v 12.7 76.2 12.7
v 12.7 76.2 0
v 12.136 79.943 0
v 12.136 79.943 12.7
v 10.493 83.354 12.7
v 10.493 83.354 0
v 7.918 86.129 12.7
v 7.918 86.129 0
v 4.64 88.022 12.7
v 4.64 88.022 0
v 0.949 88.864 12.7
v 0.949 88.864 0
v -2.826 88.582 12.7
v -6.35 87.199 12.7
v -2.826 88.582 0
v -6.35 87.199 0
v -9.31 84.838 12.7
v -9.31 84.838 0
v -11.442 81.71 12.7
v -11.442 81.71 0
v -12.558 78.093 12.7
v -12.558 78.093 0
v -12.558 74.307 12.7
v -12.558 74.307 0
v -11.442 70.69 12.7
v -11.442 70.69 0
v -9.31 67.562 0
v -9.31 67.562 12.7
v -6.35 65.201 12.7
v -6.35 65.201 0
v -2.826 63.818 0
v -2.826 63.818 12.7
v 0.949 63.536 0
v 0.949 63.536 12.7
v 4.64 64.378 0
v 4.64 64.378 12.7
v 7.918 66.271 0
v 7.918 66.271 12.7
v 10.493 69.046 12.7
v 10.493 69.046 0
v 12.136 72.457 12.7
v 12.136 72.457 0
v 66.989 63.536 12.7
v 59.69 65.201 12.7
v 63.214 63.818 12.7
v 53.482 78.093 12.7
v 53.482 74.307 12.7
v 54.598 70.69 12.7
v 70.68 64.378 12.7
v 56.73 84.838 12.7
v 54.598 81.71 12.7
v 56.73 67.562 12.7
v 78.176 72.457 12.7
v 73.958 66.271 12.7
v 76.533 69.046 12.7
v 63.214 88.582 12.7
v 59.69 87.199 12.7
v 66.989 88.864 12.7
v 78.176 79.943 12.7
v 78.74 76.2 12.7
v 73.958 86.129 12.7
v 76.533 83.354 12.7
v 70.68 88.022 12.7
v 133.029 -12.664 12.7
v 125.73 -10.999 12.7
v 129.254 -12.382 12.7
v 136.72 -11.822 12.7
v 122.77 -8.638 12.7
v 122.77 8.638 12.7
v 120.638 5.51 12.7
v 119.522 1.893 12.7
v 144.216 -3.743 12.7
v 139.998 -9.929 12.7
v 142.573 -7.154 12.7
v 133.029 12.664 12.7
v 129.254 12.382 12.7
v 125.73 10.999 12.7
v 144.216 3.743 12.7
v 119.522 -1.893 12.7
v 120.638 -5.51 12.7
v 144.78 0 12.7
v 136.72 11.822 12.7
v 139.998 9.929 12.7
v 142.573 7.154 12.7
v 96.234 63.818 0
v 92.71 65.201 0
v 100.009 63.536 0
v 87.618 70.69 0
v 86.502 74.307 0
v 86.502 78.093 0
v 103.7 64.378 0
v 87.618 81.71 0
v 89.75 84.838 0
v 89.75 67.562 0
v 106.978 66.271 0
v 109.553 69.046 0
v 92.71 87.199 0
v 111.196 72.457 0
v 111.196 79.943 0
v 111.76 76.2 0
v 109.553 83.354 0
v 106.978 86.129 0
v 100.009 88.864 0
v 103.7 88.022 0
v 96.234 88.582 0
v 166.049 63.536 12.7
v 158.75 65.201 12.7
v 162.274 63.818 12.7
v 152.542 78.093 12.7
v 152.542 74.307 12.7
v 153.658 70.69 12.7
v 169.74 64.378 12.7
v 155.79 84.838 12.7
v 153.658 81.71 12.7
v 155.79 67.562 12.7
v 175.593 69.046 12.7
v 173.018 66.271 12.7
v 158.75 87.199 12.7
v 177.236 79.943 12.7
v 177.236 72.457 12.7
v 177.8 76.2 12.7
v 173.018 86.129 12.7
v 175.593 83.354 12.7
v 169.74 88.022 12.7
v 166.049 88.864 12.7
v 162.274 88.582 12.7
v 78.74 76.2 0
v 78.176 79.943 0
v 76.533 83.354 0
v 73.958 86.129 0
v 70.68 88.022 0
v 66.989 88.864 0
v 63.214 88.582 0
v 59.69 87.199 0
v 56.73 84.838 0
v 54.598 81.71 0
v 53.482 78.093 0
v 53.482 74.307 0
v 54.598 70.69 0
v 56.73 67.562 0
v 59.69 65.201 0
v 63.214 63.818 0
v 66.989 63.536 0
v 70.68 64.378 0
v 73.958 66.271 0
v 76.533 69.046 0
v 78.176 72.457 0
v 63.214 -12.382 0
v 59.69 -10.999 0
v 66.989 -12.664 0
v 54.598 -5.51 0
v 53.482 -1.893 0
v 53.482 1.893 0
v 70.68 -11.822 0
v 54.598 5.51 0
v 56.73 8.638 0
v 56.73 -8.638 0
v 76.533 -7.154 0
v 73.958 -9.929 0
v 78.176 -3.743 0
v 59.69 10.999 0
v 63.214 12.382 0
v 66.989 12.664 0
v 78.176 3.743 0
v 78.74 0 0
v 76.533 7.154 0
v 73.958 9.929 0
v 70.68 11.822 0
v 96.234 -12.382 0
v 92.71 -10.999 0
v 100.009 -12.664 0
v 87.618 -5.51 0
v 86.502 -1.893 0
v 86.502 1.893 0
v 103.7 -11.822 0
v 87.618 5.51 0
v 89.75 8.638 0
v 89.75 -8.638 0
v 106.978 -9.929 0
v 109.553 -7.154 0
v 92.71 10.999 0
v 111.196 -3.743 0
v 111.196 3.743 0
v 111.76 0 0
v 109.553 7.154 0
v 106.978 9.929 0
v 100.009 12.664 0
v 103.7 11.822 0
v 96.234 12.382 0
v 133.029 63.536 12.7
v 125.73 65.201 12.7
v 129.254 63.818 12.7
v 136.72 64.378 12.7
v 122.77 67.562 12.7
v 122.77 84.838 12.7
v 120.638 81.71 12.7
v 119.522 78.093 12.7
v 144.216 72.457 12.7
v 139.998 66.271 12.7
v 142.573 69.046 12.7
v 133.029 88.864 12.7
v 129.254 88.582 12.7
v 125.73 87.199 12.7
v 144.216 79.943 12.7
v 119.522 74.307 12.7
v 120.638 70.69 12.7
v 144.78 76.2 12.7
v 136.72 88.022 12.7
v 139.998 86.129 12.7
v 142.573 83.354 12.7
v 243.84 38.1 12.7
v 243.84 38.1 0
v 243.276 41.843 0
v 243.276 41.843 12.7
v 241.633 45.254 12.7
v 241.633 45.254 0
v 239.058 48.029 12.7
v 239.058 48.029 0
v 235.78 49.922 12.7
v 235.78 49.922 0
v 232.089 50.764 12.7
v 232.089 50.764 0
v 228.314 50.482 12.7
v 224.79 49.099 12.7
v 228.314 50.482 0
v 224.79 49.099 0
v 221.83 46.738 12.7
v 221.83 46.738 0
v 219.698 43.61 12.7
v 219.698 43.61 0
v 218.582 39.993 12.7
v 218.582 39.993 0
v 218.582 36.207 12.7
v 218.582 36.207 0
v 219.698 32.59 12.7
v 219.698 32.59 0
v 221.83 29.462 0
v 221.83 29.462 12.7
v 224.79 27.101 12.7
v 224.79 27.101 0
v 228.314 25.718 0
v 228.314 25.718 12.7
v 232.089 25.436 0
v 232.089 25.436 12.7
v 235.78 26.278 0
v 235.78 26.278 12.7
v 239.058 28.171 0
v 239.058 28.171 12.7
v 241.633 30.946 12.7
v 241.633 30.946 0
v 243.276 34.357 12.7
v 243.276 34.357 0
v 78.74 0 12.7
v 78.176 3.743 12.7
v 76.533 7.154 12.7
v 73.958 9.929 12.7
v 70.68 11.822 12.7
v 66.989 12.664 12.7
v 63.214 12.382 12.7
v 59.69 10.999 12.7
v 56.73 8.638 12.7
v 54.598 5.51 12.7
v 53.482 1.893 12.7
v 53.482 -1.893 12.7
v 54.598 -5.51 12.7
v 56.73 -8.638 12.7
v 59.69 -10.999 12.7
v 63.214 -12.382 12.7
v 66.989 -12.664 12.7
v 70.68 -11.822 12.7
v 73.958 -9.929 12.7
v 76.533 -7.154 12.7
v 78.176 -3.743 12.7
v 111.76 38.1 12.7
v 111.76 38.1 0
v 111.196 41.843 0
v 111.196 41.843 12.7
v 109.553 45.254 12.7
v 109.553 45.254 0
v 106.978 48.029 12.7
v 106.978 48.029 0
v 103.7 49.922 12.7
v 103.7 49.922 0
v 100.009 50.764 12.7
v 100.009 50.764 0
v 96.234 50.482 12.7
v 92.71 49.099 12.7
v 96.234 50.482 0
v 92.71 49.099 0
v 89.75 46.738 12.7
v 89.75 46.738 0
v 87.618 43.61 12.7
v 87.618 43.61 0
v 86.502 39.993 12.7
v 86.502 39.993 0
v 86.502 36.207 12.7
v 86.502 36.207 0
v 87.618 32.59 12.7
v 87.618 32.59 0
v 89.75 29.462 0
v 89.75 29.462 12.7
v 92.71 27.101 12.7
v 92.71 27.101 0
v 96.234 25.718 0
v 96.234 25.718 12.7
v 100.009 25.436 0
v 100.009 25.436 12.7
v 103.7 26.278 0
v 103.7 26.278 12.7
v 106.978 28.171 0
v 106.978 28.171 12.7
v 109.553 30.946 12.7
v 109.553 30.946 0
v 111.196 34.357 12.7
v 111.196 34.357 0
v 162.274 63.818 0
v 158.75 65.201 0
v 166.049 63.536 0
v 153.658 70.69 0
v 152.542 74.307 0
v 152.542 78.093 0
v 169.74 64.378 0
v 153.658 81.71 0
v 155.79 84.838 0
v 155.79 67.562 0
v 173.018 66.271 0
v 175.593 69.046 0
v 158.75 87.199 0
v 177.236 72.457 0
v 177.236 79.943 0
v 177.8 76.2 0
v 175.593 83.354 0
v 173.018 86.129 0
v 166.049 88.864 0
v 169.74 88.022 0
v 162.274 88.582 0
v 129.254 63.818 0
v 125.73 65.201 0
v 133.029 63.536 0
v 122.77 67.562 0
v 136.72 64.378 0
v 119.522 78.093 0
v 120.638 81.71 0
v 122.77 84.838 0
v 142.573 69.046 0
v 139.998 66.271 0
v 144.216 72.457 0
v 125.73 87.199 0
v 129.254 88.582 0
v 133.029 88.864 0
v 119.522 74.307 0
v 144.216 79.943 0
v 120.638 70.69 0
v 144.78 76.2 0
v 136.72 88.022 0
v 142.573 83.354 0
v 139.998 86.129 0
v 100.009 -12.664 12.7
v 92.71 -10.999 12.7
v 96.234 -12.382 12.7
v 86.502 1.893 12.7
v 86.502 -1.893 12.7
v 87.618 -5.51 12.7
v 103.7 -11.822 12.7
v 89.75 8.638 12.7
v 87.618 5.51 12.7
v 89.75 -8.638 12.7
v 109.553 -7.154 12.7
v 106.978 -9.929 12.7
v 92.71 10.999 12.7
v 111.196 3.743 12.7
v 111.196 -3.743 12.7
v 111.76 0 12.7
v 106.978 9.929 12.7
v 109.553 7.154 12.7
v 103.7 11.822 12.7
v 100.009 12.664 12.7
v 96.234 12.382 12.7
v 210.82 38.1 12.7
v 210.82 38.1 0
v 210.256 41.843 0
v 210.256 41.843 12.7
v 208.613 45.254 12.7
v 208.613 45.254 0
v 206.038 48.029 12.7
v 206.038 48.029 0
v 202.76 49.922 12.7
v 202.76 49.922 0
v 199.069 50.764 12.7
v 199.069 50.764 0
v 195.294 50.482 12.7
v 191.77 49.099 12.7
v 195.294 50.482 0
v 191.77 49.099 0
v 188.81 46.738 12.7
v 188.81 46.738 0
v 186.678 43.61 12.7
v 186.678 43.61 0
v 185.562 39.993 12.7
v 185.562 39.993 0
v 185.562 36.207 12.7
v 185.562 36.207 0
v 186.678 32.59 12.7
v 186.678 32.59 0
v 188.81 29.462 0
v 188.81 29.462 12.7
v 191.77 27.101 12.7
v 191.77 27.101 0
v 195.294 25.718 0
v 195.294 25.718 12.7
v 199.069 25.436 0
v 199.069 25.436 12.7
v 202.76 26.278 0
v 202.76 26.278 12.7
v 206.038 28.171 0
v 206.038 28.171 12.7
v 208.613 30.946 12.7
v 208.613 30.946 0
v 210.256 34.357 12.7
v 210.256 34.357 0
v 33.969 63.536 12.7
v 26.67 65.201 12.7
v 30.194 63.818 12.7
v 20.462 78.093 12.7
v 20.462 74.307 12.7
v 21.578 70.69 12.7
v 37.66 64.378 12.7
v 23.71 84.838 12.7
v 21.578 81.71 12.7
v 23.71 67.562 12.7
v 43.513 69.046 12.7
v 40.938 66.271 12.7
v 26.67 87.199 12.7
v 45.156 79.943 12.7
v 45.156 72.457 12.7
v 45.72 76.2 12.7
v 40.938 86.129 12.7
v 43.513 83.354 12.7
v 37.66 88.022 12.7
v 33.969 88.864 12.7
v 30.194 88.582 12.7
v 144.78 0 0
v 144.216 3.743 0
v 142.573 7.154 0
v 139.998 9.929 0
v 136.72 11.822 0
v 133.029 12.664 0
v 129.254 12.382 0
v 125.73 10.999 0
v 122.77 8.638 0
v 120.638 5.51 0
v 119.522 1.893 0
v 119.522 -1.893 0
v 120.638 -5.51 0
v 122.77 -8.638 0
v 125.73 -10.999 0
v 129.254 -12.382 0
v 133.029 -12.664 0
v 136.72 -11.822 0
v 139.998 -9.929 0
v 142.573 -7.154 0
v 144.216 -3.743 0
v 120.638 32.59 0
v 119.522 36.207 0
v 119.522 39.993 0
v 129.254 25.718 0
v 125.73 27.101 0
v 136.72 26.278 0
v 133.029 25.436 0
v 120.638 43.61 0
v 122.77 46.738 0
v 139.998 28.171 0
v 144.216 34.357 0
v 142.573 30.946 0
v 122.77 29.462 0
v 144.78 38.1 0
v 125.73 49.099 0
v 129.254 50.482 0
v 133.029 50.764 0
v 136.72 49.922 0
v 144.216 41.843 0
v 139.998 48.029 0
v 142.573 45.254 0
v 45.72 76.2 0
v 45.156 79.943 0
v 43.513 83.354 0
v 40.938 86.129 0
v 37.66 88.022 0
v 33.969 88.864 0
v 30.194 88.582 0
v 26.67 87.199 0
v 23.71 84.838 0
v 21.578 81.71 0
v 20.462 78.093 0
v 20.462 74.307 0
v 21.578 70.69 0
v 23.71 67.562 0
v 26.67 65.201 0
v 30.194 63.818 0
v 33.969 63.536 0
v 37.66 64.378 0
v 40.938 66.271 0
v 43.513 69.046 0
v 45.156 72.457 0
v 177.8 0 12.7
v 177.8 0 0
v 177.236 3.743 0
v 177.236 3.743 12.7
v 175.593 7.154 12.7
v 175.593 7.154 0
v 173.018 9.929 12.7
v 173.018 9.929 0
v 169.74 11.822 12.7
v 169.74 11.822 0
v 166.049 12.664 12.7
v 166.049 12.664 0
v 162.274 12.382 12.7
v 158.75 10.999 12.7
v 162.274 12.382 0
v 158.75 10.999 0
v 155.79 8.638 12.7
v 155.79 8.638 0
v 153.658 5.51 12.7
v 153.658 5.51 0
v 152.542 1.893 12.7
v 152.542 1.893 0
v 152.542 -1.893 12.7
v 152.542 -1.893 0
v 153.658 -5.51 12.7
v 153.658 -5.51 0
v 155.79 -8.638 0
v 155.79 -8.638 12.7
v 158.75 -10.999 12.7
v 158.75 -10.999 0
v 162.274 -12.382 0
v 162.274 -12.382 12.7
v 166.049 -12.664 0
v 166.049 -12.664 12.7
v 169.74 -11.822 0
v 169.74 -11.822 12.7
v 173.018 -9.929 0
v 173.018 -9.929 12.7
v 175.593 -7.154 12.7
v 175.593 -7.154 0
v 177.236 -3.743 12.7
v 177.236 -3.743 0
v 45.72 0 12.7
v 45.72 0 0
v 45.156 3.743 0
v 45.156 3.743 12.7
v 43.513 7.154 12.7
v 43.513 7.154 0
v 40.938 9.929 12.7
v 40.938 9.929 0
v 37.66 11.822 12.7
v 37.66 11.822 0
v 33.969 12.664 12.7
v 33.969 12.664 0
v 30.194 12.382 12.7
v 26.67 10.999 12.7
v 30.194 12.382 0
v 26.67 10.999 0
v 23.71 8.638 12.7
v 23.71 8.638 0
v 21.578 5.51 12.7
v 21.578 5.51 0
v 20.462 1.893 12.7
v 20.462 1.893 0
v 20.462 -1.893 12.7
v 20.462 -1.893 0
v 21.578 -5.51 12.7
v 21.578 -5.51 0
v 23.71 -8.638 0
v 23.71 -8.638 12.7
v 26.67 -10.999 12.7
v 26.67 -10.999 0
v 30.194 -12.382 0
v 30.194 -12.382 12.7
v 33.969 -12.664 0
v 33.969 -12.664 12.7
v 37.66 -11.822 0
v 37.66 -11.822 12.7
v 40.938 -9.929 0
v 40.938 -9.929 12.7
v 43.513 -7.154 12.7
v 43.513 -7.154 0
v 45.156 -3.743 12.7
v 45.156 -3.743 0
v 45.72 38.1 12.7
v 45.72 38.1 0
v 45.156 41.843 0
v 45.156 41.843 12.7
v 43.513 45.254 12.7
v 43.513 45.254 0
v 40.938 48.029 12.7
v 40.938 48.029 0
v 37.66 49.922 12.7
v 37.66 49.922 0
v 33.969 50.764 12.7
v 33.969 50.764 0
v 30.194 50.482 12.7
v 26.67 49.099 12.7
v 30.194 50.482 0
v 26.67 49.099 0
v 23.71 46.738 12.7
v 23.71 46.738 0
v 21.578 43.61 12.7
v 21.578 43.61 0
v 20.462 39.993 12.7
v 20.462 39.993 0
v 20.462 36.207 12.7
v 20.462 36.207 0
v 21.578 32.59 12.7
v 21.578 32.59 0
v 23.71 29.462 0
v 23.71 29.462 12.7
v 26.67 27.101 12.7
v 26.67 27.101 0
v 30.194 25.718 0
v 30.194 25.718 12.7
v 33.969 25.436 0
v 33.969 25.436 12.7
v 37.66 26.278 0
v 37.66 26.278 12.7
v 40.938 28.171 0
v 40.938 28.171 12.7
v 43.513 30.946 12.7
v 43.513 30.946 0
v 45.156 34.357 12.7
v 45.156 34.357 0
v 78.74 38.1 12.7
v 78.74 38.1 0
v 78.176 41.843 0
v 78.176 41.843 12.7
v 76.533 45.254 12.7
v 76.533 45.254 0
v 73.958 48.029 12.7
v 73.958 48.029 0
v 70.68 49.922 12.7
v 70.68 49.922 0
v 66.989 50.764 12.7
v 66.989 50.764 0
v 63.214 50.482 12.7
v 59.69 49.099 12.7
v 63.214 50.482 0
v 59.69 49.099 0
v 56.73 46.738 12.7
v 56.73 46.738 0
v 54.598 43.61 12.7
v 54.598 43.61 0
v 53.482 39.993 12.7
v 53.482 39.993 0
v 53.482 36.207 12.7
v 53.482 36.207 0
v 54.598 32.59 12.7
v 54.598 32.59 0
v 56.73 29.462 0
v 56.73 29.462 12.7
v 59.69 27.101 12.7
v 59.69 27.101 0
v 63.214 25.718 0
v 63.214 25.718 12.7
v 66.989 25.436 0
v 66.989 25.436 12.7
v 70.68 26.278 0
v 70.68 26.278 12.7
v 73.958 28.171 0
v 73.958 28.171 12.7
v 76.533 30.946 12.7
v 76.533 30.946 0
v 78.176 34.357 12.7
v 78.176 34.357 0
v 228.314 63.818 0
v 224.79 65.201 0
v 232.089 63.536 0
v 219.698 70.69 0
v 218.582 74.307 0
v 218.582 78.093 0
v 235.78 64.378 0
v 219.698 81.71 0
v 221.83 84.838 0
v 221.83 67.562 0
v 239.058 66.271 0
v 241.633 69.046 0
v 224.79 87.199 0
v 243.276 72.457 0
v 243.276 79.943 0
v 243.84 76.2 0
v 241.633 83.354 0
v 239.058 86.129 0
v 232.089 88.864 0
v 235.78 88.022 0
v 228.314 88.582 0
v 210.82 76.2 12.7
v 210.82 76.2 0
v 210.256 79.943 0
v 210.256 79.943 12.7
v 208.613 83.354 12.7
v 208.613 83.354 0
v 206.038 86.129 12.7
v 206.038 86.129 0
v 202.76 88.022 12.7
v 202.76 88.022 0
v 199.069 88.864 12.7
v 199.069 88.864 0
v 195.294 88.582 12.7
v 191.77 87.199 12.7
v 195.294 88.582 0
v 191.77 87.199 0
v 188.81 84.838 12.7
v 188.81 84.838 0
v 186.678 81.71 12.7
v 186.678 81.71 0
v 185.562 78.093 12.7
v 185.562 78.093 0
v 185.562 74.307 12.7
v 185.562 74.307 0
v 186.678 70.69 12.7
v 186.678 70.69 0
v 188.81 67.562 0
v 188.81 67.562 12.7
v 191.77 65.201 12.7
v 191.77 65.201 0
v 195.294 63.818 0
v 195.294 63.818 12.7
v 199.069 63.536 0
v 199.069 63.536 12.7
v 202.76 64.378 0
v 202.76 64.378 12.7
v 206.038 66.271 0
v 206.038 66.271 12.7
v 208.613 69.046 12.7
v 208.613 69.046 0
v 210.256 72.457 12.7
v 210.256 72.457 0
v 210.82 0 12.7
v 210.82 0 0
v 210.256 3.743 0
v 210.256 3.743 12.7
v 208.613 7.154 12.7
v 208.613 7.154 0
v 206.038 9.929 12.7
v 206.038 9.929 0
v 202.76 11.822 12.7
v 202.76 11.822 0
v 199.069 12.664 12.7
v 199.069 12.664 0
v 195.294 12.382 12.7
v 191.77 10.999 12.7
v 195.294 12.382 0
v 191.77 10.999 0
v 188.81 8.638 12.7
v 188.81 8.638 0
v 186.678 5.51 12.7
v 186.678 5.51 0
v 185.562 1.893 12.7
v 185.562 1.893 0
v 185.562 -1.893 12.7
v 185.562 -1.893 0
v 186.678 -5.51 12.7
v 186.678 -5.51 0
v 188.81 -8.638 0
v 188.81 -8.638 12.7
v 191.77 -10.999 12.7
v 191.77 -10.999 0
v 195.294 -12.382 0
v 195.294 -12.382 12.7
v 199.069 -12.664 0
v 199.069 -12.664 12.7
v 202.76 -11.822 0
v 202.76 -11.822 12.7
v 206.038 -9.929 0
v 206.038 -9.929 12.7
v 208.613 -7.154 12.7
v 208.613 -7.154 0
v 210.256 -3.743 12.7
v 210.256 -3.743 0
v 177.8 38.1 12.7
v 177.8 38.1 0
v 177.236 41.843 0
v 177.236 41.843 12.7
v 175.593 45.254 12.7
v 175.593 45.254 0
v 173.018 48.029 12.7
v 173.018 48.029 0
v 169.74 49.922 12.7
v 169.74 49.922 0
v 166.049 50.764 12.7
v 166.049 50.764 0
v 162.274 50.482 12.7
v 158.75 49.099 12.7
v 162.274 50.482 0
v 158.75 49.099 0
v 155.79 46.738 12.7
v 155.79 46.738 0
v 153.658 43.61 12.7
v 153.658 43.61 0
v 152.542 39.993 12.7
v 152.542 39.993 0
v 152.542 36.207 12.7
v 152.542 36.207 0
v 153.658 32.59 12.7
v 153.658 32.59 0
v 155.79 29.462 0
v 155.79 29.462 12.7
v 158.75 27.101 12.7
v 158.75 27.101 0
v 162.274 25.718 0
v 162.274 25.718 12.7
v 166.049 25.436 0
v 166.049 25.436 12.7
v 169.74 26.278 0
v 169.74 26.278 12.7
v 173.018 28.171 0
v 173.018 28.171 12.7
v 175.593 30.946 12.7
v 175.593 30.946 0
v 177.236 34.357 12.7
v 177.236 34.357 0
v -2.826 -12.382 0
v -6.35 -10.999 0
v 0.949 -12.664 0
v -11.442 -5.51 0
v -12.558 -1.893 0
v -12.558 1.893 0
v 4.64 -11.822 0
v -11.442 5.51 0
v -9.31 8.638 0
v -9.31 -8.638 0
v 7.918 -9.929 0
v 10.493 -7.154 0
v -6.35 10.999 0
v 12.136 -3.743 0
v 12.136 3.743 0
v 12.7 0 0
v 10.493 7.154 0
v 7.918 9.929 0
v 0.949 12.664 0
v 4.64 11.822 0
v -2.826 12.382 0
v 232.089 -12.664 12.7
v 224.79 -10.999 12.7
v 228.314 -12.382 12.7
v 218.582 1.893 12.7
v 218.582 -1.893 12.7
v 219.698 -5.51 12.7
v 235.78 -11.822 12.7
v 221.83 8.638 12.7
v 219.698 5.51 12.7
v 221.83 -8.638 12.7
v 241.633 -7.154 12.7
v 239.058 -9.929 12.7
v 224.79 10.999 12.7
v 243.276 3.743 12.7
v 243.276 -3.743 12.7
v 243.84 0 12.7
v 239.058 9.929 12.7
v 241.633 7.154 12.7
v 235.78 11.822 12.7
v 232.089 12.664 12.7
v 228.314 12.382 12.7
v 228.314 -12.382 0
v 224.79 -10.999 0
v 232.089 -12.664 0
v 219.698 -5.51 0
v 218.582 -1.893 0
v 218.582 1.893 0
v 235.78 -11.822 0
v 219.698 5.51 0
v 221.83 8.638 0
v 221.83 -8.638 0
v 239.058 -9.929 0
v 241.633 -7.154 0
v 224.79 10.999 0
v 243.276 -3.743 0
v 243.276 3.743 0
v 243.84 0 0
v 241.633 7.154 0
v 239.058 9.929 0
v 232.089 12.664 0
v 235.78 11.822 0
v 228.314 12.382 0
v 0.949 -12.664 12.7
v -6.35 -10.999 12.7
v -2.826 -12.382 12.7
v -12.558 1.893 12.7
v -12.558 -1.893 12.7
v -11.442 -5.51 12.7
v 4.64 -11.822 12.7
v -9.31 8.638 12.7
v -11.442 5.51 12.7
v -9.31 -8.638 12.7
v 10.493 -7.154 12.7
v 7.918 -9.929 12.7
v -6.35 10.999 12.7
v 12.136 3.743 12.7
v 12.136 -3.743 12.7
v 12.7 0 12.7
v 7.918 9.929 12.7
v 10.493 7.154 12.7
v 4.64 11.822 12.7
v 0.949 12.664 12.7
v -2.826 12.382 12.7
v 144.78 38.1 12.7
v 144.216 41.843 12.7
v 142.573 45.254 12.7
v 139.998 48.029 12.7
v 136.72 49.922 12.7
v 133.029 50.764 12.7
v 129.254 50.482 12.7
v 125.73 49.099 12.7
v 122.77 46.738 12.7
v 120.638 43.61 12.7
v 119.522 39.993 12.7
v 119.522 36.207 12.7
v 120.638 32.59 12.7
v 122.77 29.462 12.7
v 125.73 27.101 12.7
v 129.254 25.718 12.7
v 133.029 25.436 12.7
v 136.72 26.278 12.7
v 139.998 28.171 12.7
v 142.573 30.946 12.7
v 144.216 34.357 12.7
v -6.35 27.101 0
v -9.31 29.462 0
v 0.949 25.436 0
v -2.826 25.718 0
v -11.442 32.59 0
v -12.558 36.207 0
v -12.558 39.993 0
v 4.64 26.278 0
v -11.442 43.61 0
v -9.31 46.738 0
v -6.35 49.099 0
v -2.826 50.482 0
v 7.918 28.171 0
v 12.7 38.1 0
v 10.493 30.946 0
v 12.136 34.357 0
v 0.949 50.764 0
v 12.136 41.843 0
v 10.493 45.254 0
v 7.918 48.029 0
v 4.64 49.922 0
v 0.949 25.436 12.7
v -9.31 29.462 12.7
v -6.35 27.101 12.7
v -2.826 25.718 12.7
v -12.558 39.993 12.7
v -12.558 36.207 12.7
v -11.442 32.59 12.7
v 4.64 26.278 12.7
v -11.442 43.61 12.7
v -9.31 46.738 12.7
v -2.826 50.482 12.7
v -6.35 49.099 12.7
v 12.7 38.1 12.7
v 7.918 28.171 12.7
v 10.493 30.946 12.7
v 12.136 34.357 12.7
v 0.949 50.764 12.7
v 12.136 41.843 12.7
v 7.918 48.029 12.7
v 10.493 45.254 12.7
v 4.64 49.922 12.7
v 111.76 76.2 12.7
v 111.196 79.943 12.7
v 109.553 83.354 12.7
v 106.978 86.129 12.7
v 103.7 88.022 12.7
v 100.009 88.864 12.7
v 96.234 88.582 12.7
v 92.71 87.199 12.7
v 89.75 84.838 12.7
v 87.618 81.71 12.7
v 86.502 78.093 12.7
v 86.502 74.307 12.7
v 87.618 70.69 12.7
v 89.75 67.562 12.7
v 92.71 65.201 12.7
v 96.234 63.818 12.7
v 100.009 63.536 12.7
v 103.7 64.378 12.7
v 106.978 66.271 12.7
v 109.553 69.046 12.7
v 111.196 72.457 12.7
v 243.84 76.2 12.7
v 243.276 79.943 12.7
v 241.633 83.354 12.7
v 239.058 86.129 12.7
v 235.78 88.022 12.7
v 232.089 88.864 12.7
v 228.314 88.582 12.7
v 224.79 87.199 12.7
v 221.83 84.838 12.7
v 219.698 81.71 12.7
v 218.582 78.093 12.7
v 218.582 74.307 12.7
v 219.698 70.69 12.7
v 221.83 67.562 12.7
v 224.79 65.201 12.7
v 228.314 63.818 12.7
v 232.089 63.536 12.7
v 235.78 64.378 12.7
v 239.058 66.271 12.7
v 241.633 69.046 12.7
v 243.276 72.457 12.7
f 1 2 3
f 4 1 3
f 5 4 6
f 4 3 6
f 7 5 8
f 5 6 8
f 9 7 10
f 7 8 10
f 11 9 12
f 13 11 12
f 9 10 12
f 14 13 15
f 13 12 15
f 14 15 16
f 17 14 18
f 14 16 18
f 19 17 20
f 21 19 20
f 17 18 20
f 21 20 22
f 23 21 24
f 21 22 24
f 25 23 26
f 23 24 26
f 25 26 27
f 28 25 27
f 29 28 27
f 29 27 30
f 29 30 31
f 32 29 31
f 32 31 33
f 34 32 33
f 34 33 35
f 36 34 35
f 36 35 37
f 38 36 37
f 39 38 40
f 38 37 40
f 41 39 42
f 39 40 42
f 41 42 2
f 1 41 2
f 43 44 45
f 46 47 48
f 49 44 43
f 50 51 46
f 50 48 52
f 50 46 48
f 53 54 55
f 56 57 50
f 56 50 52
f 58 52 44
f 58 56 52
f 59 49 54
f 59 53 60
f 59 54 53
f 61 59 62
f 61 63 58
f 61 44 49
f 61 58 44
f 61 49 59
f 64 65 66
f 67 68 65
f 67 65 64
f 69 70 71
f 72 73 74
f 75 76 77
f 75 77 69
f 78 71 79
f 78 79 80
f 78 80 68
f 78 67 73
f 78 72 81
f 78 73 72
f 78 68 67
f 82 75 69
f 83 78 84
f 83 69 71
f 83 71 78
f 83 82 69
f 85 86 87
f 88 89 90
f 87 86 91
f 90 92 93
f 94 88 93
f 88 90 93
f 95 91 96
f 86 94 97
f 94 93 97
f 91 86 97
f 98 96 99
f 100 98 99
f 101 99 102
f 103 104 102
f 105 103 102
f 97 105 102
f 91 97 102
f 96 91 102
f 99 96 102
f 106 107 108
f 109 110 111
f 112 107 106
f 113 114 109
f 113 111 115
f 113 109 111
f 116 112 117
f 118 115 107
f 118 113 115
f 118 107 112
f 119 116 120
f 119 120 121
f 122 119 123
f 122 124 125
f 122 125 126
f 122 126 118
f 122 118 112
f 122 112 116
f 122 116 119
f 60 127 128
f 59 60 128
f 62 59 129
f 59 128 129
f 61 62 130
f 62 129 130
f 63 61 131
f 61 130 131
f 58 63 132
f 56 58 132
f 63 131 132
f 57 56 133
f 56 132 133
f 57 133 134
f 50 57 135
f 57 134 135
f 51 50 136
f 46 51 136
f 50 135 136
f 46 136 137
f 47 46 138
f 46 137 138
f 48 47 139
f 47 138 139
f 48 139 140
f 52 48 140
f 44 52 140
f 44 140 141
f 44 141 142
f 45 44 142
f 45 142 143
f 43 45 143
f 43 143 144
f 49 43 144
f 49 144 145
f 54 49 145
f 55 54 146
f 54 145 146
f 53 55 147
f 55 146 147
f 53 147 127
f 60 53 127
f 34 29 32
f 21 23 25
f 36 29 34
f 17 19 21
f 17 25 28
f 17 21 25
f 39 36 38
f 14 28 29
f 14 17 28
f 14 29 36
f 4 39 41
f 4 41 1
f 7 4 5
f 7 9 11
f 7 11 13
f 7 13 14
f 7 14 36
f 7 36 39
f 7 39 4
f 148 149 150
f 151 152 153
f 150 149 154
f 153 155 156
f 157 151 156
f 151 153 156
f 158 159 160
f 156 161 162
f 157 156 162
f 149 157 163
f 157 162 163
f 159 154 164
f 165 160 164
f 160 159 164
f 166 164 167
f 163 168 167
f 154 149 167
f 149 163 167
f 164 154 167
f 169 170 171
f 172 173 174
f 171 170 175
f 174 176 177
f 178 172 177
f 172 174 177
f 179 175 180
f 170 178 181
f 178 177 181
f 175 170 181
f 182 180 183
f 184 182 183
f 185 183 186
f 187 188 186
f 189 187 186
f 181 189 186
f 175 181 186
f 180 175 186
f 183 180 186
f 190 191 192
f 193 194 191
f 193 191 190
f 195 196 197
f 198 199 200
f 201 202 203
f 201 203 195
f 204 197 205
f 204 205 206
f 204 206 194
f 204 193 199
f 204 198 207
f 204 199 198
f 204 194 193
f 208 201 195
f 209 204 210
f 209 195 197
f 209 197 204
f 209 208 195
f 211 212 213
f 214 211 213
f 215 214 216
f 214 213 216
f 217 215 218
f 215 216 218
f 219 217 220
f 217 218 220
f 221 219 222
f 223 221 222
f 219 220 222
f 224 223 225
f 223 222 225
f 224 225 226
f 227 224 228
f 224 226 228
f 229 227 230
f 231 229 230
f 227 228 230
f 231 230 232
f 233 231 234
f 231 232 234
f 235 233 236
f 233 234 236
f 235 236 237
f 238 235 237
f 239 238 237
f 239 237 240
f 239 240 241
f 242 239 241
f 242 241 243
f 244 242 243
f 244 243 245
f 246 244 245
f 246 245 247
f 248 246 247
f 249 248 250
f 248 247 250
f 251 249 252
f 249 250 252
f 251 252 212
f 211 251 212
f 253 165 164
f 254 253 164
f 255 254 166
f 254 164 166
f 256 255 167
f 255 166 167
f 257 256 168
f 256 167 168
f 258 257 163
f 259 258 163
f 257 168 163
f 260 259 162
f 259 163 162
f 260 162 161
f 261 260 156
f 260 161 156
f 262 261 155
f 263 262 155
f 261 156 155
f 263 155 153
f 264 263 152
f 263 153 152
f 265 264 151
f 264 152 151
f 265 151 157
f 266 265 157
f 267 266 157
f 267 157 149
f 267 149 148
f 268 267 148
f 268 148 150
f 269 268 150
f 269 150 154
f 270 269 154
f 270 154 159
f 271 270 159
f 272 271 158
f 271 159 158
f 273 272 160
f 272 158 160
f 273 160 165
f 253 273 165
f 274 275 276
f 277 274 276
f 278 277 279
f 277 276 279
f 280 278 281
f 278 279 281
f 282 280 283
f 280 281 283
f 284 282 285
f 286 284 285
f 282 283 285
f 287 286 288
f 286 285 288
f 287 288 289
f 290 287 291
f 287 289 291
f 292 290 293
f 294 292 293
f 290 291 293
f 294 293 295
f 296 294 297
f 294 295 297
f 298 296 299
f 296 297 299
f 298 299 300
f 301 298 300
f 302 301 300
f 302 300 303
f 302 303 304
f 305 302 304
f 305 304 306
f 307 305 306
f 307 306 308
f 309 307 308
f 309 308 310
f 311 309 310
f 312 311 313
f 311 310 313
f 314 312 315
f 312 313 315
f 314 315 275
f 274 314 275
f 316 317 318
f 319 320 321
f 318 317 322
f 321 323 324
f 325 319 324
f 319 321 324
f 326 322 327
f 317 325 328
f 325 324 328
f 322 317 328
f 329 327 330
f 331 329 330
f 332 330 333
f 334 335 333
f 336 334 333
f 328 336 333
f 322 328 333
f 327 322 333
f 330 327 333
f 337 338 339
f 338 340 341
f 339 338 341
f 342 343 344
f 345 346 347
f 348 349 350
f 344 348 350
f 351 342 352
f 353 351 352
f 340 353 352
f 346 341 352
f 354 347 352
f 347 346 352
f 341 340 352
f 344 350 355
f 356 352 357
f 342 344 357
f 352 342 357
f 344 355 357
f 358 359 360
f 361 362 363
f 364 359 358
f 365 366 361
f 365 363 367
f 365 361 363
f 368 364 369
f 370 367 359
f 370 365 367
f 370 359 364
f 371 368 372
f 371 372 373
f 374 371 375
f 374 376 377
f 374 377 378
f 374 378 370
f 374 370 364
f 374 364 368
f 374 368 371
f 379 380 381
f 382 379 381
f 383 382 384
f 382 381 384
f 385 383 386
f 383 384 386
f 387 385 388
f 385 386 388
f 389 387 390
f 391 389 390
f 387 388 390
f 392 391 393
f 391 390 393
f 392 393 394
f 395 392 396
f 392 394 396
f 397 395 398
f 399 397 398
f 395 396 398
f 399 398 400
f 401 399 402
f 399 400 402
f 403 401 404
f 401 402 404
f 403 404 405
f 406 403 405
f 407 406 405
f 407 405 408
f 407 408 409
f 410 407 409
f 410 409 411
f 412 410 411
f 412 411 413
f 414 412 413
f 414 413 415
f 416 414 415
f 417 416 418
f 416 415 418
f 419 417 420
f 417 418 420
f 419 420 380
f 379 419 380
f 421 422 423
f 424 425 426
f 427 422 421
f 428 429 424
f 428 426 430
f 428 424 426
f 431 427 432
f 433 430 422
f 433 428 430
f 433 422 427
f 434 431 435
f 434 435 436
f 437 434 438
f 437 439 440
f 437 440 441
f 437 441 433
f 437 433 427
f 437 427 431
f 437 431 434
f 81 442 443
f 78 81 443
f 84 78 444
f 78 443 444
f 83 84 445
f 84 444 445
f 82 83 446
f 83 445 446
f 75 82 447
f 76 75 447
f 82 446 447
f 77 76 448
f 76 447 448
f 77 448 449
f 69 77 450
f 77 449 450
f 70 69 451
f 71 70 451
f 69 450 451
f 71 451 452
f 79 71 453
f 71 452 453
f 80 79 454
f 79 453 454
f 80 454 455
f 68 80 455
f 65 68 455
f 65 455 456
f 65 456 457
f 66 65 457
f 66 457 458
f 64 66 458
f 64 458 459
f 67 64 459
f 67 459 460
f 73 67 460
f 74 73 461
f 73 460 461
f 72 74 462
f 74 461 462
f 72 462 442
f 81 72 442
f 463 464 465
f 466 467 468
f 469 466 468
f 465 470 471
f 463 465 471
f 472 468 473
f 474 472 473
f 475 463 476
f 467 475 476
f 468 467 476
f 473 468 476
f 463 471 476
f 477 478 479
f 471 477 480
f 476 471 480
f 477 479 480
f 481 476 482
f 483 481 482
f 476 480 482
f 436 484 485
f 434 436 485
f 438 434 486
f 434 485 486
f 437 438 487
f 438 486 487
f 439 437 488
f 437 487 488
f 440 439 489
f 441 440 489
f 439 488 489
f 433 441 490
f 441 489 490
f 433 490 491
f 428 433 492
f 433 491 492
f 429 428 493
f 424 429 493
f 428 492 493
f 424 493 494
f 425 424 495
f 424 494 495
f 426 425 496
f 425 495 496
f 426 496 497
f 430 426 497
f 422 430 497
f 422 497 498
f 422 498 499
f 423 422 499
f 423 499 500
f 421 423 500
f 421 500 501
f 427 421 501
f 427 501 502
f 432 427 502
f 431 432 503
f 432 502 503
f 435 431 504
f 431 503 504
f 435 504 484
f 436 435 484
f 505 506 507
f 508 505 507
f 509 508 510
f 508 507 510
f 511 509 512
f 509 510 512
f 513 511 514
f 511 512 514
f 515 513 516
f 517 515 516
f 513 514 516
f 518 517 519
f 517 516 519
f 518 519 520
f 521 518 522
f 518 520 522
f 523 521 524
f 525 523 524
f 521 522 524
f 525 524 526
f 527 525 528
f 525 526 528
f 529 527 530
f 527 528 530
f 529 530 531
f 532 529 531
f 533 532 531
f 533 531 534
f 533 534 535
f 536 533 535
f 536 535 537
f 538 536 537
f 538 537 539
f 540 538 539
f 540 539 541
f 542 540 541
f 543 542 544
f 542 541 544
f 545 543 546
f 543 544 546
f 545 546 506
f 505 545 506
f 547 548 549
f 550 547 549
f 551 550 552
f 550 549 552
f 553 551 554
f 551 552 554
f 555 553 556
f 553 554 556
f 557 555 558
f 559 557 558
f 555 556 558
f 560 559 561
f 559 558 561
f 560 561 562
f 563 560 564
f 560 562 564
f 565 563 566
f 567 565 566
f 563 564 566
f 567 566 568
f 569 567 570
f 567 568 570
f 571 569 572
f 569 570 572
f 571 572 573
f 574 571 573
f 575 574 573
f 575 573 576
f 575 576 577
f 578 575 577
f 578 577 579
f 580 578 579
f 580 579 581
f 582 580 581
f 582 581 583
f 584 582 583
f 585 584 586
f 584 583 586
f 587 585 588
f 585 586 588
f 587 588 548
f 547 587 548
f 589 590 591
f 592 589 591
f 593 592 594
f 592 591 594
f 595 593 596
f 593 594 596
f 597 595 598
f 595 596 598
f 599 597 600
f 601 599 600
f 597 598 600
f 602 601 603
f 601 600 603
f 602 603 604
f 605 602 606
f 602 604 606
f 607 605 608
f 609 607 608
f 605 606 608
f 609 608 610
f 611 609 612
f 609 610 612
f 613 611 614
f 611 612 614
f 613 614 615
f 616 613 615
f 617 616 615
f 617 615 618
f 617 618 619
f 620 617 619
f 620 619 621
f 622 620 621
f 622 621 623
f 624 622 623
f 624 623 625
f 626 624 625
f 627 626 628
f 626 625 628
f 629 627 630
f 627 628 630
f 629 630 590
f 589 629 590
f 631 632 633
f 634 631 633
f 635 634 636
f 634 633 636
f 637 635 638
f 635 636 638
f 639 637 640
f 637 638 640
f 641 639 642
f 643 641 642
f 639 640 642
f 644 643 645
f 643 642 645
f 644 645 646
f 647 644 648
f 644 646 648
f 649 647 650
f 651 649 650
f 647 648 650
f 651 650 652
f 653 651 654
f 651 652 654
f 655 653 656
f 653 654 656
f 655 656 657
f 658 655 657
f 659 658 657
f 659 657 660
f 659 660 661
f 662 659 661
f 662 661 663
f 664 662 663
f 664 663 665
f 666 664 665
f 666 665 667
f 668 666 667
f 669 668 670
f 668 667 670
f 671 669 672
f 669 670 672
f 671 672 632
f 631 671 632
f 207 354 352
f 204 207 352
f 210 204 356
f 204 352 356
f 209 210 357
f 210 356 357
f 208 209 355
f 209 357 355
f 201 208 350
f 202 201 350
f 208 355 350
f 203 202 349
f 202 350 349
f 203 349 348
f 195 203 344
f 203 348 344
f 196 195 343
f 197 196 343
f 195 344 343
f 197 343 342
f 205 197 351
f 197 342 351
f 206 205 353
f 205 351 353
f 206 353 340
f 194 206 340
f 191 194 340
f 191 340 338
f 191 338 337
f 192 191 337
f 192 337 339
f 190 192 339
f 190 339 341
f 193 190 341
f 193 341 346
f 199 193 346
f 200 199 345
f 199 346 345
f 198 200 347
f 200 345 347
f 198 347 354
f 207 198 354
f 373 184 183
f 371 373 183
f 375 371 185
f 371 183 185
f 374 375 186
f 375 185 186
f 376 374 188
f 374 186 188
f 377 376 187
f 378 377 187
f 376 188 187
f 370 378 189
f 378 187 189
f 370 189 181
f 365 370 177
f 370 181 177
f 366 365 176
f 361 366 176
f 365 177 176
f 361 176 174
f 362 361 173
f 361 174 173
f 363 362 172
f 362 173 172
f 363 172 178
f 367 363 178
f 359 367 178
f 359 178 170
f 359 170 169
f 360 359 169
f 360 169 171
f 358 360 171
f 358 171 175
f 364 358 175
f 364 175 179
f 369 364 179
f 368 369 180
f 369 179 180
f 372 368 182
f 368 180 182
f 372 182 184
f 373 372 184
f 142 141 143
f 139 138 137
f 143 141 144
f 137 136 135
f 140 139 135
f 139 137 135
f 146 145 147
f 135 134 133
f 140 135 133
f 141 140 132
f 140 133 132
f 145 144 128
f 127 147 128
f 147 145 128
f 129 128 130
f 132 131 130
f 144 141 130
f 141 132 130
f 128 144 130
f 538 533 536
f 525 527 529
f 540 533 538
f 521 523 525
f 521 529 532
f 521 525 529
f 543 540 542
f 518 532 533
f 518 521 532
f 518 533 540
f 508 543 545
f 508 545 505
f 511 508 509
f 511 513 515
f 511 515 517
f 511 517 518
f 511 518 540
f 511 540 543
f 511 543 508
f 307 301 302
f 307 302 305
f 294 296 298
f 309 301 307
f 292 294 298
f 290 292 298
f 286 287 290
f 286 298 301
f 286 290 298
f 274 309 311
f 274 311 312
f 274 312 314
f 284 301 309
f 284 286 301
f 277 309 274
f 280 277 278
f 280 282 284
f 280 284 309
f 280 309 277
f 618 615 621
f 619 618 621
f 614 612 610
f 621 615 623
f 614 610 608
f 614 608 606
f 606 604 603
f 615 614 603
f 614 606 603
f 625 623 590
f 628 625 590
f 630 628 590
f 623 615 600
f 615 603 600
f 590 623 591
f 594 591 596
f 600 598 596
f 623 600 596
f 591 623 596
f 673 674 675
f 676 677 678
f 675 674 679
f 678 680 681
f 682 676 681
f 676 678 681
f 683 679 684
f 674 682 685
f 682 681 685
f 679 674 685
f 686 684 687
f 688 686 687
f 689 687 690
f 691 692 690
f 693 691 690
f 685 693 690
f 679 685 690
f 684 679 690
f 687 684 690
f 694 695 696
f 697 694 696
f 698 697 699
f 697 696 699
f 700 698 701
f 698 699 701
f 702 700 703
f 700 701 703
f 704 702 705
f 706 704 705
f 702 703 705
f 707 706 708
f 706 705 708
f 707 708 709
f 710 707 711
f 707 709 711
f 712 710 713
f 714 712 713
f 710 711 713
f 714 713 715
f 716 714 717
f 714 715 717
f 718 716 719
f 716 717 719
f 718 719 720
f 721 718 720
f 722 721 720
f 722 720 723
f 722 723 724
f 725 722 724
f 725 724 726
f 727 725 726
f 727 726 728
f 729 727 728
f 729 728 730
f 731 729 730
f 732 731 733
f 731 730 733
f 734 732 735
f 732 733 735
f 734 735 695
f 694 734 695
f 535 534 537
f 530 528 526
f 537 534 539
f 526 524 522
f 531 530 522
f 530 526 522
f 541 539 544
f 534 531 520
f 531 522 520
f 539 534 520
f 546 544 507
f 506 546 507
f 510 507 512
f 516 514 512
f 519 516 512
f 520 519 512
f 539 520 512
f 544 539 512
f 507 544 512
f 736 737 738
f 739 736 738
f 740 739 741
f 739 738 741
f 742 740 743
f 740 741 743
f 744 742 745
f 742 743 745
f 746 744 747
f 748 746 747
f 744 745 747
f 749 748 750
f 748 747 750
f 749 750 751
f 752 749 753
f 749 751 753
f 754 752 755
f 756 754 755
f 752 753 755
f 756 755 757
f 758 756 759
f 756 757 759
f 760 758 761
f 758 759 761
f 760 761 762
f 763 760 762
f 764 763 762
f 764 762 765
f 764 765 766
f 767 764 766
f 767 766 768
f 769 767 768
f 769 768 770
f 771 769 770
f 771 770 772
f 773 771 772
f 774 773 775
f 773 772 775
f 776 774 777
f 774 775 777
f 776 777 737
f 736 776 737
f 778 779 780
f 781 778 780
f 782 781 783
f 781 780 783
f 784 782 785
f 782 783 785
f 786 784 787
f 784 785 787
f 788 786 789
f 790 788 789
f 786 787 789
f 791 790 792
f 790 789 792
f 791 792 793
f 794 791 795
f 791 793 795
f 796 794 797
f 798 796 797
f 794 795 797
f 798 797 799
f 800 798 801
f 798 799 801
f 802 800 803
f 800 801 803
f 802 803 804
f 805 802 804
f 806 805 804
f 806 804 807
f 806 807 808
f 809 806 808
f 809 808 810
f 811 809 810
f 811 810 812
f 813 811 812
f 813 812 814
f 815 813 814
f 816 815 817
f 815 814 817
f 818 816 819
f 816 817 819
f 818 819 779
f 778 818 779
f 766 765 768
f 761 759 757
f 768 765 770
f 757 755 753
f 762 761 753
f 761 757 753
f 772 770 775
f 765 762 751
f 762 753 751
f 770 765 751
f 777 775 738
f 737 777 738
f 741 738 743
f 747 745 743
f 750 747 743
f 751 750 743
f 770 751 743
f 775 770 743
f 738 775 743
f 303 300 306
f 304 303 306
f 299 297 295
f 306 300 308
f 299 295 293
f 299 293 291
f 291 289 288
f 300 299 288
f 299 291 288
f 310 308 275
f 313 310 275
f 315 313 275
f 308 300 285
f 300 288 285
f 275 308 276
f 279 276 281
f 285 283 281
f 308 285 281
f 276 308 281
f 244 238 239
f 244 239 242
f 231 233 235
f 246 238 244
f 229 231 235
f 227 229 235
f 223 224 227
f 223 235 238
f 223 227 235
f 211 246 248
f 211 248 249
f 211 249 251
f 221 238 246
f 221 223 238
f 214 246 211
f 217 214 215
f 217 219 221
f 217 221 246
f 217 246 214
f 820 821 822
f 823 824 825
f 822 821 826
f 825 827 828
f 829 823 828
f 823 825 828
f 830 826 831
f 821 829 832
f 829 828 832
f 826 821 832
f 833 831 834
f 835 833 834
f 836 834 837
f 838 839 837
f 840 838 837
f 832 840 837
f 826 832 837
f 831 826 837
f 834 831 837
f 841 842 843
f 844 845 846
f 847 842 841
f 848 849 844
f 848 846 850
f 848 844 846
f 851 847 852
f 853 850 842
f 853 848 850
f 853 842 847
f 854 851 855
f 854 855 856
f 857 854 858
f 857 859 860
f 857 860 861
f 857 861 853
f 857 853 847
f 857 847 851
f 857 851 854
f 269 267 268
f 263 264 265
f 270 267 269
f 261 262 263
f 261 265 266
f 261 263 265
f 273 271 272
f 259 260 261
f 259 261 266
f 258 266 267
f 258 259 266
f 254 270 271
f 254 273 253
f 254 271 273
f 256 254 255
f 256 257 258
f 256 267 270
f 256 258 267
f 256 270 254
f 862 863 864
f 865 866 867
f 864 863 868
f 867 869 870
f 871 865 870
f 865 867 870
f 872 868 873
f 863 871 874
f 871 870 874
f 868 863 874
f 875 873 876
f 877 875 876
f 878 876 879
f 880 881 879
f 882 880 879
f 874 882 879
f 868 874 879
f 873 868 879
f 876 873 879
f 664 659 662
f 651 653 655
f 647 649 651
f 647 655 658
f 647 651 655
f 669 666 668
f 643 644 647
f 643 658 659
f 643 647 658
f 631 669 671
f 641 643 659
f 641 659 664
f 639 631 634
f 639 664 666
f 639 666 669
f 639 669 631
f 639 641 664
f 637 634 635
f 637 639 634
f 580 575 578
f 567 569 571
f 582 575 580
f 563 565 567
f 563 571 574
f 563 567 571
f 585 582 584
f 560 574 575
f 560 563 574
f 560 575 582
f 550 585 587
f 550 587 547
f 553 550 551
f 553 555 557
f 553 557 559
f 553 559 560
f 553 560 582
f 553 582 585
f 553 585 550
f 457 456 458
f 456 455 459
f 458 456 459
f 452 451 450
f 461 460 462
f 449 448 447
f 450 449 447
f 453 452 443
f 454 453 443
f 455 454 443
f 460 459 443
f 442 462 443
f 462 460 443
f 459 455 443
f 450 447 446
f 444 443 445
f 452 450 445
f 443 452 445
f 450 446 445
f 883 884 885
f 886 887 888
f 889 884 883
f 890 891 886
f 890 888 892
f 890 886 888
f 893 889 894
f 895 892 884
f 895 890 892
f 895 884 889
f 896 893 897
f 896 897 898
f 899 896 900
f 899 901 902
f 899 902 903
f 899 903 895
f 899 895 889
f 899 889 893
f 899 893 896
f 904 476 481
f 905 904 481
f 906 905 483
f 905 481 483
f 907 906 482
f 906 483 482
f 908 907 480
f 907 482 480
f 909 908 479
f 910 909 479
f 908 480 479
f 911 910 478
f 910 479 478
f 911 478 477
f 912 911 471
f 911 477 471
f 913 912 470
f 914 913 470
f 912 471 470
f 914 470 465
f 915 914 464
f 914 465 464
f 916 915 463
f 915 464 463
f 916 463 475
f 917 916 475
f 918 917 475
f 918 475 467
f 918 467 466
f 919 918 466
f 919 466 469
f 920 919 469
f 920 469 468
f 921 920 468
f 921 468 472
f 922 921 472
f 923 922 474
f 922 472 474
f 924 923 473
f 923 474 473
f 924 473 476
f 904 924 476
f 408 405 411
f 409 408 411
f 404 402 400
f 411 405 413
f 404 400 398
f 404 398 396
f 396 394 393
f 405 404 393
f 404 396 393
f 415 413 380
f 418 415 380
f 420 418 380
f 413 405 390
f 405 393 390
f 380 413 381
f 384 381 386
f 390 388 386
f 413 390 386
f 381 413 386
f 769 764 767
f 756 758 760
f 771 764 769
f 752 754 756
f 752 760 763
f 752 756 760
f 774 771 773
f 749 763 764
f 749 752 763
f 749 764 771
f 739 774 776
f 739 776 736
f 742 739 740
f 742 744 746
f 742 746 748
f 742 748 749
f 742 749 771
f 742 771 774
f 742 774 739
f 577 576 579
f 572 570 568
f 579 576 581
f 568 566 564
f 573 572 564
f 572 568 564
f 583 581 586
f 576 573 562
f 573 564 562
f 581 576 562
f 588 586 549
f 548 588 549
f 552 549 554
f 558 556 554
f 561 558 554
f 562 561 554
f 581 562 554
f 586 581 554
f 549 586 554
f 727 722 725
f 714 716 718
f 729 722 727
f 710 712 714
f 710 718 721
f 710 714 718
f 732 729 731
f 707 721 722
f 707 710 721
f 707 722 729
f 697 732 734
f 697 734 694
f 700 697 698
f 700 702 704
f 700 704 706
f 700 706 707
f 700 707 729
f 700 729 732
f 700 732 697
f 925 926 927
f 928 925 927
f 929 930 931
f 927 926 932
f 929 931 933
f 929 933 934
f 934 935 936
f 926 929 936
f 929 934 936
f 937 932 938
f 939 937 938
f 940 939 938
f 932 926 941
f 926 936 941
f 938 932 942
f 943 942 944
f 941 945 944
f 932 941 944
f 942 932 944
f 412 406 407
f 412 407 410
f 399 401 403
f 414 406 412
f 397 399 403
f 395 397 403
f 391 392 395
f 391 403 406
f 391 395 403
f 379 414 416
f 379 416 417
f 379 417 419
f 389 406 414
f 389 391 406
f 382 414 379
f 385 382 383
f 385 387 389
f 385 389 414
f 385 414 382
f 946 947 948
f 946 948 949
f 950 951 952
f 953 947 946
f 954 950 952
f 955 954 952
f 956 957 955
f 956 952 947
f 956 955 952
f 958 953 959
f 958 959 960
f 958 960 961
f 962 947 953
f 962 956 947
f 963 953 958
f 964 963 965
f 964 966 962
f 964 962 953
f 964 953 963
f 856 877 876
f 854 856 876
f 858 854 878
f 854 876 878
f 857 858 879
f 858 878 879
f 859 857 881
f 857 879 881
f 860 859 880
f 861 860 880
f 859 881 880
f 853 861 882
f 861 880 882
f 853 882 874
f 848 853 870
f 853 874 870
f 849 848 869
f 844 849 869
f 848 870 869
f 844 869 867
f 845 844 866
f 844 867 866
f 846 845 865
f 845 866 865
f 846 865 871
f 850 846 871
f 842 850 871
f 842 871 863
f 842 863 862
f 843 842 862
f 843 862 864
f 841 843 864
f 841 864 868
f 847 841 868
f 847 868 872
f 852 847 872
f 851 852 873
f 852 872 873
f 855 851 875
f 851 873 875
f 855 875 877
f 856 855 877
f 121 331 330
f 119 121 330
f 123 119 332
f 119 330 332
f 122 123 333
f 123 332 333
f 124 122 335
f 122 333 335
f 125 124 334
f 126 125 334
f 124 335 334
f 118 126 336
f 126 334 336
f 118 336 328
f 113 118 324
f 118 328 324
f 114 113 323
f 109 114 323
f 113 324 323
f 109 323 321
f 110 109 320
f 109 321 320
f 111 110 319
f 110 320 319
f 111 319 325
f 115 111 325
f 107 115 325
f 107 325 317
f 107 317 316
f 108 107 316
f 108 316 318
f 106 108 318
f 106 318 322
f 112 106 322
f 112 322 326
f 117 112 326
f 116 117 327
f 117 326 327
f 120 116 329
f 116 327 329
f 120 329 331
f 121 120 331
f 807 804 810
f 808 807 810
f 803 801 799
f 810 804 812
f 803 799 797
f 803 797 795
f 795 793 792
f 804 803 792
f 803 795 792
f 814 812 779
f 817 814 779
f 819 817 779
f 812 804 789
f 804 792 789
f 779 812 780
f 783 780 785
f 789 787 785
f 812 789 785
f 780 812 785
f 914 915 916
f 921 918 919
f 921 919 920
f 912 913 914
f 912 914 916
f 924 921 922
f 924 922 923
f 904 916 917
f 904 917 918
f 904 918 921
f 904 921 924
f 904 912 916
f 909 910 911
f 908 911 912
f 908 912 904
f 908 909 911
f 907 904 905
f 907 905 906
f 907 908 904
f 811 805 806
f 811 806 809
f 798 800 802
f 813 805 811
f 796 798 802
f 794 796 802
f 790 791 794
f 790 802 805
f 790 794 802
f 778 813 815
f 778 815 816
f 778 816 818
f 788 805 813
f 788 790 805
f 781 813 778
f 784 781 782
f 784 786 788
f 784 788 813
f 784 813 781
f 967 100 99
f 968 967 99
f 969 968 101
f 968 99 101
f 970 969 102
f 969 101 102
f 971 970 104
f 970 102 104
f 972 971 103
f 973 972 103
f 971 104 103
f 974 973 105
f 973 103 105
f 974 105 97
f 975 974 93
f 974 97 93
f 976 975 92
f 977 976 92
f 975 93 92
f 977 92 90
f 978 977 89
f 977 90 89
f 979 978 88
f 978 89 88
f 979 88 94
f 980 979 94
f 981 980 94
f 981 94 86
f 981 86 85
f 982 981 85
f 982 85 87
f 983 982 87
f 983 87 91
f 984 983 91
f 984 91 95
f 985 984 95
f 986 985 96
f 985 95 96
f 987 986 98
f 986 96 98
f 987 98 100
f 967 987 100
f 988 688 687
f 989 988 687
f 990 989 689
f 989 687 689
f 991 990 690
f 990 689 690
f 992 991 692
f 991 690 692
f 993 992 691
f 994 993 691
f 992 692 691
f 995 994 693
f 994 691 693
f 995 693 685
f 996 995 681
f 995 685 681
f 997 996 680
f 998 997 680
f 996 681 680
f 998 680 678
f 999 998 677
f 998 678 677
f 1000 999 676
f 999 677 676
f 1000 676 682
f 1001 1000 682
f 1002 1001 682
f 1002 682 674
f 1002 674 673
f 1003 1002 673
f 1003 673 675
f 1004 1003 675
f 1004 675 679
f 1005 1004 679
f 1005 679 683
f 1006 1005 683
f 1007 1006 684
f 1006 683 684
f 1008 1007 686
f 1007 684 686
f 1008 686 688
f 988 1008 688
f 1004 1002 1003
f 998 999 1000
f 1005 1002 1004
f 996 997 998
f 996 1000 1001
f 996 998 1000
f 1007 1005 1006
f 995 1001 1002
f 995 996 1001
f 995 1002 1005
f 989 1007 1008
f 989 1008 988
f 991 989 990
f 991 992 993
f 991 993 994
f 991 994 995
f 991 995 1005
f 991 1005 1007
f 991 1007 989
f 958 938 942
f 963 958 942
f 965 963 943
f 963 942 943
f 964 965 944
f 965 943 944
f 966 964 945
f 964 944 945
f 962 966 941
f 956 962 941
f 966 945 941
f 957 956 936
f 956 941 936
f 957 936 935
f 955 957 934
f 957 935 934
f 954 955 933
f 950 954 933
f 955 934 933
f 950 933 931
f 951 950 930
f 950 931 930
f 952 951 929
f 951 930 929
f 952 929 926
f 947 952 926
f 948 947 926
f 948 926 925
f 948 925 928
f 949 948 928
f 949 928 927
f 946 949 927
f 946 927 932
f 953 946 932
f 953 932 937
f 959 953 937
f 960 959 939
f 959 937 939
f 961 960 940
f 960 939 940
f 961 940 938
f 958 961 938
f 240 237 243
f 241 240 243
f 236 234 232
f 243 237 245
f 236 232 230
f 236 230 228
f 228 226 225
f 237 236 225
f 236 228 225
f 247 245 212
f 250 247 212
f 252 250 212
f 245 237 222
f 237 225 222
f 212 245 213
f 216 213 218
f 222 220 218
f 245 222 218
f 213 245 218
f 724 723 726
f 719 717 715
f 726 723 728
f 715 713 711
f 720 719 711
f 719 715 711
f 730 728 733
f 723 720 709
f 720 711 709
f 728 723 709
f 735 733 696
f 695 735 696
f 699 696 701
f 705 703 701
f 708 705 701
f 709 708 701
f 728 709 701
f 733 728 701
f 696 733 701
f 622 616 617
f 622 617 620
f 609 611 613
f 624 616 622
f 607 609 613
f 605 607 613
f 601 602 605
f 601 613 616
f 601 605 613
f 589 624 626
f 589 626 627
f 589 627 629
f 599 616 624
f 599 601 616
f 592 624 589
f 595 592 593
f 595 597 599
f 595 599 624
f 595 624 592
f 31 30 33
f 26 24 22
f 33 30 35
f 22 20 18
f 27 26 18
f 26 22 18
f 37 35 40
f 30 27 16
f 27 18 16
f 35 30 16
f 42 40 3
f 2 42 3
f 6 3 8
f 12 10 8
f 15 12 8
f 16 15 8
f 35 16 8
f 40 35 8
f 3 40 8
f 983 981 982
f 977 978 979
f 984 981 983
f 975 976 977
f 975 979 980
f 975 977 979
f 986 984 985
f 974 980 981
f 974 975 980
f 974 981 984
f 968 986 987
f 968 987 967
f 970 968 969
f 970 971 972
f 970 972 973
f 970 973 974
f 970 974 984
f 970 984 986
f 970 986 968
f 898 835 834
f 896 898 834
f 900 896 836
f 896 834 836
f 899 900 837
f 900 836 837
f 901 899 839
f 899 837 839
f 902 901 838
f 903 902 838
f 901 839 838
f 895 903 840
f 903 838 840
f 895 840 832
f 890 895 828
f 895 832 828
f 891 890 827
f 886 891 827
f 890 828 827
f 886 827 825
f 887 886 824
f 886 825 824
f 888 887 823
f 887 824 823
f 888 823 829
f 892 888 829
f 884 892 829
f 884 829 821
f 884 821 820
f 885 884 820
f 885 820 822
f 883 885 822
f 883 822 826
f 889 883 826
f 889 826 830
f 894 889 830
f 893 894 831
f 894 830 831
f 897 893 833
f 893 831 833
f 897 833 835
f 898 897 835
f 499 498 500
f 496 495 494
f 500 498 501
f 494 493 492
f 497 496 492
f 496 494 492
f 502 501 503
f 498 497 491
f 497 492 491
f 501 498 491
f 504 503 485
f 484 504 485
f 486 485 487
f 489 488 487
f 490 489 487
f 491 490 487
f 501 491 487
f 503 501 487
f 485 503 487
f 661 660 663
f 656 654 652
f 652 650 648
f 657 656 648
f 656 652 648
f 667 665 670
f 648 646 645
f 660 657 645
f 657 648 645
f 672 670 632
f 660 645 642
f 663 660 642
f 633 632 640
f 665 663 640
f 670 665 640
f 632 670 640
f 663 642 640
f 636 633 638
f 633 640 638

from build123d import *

# Parameters (mm, degrees)
F0_R     = 12.7
F1_DEPTH = 12.7


# Not quite as in the source:
# - a feature names something its author has since deleted; it is built from what else it names


with BuildPart() as f1:
    # F0 (on Top) → F1 (new body)
    with BuildSketch(Plane.XY):
        with Locations((231.14, 0)):
            Circle(F0_R)
    extrude(amount=F1_DEPTH)


with BuildPart() as f1b:
    # F0 (on Top) → F1, piece 2 (new body)
    with BuildSketch(Plane.XY):
        with Locations((198.12, 0)):
            Circle(F0_R)
    extrude(amount=F1_DEPTH)


with BuildPart() as f1c:
    # F0 (on Top) → F1, piece 3 (new body)
    with BuildSketch(Plane.XY):
        with Locations((165.1, 0)):
            Circle(F0_R)
    extrude(amount=F1_DEPTH)


with BuildPart() as f1d:
    # F0 (on Top) → F1, piece 4 (new body)
    with BuildSketch(Plane.XY):
        with Locations((132.08, 0)):
            Circle(F0_R)
    extrude(amount=F1_DEPTH)


with BuildPart() as f1e:
    # F0 (on Top) → F1, piece 5 (new body)
    with BuildSketch(Plane.XY):
        with Locations((99.06, 0)):
            Circle(F0_R)
    extrude(amount=F1_DEPTH)


with BuildPart() as f1f:
    # F0 (on Top) → F1, piece 6 (new body)
    with BuildSketch(Plane.XY):
        with Locations((33.02, 0)):
            Circle(F0_R)
    extrude(amount=F1_DEPTH)


with BuildPart() as f1g:
    # F0 (on Top) → F1, piece 7 (new body)
    with BuildSketch(Plane.XY):
        with Locations((66.04, 0)):
            Circle(F0_R)
    extrude(amount=F1_DEPTH)


with BuildPart() as f1h:
    # F0 (on Top) → F1, piece 8 (new body)
    with BuildSketch(Plane.XY):
        Circle(F0_R)
    extrude(amount=F1_DEPTH)


with BuildPart() as f1i:
    # F0 (on Top) → F1, piece 9 (new body)
    with BuildSketch(Plane.XY):
        with Locations((0, 38.1)):
            Circle(F0_R)
    extrude(amount=F1_DEPTH)


with BuildPart() as f1j:
    # F0 (on Top) → F1, piece 10 (new body)
    with BuildSketch(Plane.XY):
        with Locations((33.02, 38.1)):
            Circle(F0_R)
    extrude(amount=F1_DEPTH)


with BuildPart() as f1k:
    # F0 (on Top) → F1, piece 11 (new body)
    with BuildSketch(Plane.XY):
        with Locations((66.04, 38.1)):
            Circle(F0_R)
    extrude(amount=F1_DEPTH)


with BuildPart() as f1l:
    # F0 (on Top) → F1, piece 12 (new body)
    with BuildSketch(Plane.XY):
        with Locations((99.06, 38.1)):
            Circle(F0_R)
    extrude(amount=F1_DEPTH)


with BuildPart() as f1m:
    # F0 (on Top) → F1, piece 13 (new body)
    with BuildSketch(Plane.XY):
        with Locations((132.08, 38.1)):
            Circle(F0_R)
    extrude(amount=F1_DEPTH)


with BuildPart() as f1n:
    # F0 (on Top) → F1, piece 14 (new body)
    with BuildSketch(Plane.XY):
        with Locations((165.1, 38.1)):
            Circle(F0_R)
    extrude(amount=F1_DEPTH)


with BuildPart() as f1o:
    # F0 (on Top) → F1, piece 15 (new body)
    with BuildSketch(Plane.XY):
        with Locations((198.12, 38.1)):
            Circle(F0_R)
    extrude(amount=F1_DEPTH)


with BuildPart() as f1p:
    # F0 (on Top) → F1, piece 16 (new body)
    with BuildSketch(Plane.XY):
        with Locations((231.14, 38.1)):
            Circle(F0_R)
    extrude(amount=F1_DEPTH)


with BuildPart() as f1q:
    # F0 (on Top) → F1, piece 17 (new body)
    with BuildSketch(Plane.XY):
        with Locations((198.12, 76.2)):
            Circle(F0_R)
    extrude(amount=F1_DEPTH)


with BuildPart() as f1r:
    # F0 (on Top) → F1, piece 18 (new body)
    with BuildSketch(Plane.XY):
        with Locations((165.1, 76.2)):
            Circle(F0_R)
    extrude(amount=F1_DEPTH)


with BuildPart() as f1s:
    # F0 (on Top) → F1, piece 19 (new body)
    with BuildSketch(Plane.XY):
        with Locations((132.08, 76.2)):
            Circle(F0_R)
    extrude(amount=F1_DEPTH)


with BuildPart() as f1t:
    # F0 (on Top) → F1, piece 20 (new body)
    with BuildSketch(Plane.XY):
        with Locations((99.06, 76.2)):
            Circle(F0_R)
    extrude(amount=F1_DEPTH)


with BuildPart() as f1u:
    # F0 (on Top) → F1, piece 21 (new body)
    with BuildSketch(Plane.XY):
        with Locations((66.04, 76.2)):
            Circle(F0_R)
    extrude(amount=F1_DEPTH)


with BuildPart() as f1v:
    # F0 (on Top) → F1, piece 22 (new body)
    with BuildSketch(Plane.XY):
        with Locations((33.02, 76.2)):
            Circle(F0_R)
    extrude(amount=F1_DEPTH)


with BuildPart() as f1w:
    # F0 (on Top) → F1, piece 23 (new body)
    with BuildSketch(Plane.XY):
        with Locations((0, 76.2)):
            Circle(F0_R)
    extrude(amount=F1_DEPTH)


with BuildPart() as f1x:
    # F0 (on Top) → F1, piece 24 (new body)
    with BuildSketch(Plane.XY):
        with Locations((231.14, 76.2)):
            Circle(F0_R)
    extrude(amount=F1_DEPTH)


solid = Compound([f1.part, f1b.part, f1c.part, f1d.part, f1e.part, f1f.part, f1g.part, f1h.part, f1i.part, f1j.part, f1k.part, f1l.part, f1m.part, f1n.part, f1o.part, f1p.part, f1q.part, f1r.part, f1s.part, f1t.part, f1u.part, f1v.part, f1w.part, f1x.part])
